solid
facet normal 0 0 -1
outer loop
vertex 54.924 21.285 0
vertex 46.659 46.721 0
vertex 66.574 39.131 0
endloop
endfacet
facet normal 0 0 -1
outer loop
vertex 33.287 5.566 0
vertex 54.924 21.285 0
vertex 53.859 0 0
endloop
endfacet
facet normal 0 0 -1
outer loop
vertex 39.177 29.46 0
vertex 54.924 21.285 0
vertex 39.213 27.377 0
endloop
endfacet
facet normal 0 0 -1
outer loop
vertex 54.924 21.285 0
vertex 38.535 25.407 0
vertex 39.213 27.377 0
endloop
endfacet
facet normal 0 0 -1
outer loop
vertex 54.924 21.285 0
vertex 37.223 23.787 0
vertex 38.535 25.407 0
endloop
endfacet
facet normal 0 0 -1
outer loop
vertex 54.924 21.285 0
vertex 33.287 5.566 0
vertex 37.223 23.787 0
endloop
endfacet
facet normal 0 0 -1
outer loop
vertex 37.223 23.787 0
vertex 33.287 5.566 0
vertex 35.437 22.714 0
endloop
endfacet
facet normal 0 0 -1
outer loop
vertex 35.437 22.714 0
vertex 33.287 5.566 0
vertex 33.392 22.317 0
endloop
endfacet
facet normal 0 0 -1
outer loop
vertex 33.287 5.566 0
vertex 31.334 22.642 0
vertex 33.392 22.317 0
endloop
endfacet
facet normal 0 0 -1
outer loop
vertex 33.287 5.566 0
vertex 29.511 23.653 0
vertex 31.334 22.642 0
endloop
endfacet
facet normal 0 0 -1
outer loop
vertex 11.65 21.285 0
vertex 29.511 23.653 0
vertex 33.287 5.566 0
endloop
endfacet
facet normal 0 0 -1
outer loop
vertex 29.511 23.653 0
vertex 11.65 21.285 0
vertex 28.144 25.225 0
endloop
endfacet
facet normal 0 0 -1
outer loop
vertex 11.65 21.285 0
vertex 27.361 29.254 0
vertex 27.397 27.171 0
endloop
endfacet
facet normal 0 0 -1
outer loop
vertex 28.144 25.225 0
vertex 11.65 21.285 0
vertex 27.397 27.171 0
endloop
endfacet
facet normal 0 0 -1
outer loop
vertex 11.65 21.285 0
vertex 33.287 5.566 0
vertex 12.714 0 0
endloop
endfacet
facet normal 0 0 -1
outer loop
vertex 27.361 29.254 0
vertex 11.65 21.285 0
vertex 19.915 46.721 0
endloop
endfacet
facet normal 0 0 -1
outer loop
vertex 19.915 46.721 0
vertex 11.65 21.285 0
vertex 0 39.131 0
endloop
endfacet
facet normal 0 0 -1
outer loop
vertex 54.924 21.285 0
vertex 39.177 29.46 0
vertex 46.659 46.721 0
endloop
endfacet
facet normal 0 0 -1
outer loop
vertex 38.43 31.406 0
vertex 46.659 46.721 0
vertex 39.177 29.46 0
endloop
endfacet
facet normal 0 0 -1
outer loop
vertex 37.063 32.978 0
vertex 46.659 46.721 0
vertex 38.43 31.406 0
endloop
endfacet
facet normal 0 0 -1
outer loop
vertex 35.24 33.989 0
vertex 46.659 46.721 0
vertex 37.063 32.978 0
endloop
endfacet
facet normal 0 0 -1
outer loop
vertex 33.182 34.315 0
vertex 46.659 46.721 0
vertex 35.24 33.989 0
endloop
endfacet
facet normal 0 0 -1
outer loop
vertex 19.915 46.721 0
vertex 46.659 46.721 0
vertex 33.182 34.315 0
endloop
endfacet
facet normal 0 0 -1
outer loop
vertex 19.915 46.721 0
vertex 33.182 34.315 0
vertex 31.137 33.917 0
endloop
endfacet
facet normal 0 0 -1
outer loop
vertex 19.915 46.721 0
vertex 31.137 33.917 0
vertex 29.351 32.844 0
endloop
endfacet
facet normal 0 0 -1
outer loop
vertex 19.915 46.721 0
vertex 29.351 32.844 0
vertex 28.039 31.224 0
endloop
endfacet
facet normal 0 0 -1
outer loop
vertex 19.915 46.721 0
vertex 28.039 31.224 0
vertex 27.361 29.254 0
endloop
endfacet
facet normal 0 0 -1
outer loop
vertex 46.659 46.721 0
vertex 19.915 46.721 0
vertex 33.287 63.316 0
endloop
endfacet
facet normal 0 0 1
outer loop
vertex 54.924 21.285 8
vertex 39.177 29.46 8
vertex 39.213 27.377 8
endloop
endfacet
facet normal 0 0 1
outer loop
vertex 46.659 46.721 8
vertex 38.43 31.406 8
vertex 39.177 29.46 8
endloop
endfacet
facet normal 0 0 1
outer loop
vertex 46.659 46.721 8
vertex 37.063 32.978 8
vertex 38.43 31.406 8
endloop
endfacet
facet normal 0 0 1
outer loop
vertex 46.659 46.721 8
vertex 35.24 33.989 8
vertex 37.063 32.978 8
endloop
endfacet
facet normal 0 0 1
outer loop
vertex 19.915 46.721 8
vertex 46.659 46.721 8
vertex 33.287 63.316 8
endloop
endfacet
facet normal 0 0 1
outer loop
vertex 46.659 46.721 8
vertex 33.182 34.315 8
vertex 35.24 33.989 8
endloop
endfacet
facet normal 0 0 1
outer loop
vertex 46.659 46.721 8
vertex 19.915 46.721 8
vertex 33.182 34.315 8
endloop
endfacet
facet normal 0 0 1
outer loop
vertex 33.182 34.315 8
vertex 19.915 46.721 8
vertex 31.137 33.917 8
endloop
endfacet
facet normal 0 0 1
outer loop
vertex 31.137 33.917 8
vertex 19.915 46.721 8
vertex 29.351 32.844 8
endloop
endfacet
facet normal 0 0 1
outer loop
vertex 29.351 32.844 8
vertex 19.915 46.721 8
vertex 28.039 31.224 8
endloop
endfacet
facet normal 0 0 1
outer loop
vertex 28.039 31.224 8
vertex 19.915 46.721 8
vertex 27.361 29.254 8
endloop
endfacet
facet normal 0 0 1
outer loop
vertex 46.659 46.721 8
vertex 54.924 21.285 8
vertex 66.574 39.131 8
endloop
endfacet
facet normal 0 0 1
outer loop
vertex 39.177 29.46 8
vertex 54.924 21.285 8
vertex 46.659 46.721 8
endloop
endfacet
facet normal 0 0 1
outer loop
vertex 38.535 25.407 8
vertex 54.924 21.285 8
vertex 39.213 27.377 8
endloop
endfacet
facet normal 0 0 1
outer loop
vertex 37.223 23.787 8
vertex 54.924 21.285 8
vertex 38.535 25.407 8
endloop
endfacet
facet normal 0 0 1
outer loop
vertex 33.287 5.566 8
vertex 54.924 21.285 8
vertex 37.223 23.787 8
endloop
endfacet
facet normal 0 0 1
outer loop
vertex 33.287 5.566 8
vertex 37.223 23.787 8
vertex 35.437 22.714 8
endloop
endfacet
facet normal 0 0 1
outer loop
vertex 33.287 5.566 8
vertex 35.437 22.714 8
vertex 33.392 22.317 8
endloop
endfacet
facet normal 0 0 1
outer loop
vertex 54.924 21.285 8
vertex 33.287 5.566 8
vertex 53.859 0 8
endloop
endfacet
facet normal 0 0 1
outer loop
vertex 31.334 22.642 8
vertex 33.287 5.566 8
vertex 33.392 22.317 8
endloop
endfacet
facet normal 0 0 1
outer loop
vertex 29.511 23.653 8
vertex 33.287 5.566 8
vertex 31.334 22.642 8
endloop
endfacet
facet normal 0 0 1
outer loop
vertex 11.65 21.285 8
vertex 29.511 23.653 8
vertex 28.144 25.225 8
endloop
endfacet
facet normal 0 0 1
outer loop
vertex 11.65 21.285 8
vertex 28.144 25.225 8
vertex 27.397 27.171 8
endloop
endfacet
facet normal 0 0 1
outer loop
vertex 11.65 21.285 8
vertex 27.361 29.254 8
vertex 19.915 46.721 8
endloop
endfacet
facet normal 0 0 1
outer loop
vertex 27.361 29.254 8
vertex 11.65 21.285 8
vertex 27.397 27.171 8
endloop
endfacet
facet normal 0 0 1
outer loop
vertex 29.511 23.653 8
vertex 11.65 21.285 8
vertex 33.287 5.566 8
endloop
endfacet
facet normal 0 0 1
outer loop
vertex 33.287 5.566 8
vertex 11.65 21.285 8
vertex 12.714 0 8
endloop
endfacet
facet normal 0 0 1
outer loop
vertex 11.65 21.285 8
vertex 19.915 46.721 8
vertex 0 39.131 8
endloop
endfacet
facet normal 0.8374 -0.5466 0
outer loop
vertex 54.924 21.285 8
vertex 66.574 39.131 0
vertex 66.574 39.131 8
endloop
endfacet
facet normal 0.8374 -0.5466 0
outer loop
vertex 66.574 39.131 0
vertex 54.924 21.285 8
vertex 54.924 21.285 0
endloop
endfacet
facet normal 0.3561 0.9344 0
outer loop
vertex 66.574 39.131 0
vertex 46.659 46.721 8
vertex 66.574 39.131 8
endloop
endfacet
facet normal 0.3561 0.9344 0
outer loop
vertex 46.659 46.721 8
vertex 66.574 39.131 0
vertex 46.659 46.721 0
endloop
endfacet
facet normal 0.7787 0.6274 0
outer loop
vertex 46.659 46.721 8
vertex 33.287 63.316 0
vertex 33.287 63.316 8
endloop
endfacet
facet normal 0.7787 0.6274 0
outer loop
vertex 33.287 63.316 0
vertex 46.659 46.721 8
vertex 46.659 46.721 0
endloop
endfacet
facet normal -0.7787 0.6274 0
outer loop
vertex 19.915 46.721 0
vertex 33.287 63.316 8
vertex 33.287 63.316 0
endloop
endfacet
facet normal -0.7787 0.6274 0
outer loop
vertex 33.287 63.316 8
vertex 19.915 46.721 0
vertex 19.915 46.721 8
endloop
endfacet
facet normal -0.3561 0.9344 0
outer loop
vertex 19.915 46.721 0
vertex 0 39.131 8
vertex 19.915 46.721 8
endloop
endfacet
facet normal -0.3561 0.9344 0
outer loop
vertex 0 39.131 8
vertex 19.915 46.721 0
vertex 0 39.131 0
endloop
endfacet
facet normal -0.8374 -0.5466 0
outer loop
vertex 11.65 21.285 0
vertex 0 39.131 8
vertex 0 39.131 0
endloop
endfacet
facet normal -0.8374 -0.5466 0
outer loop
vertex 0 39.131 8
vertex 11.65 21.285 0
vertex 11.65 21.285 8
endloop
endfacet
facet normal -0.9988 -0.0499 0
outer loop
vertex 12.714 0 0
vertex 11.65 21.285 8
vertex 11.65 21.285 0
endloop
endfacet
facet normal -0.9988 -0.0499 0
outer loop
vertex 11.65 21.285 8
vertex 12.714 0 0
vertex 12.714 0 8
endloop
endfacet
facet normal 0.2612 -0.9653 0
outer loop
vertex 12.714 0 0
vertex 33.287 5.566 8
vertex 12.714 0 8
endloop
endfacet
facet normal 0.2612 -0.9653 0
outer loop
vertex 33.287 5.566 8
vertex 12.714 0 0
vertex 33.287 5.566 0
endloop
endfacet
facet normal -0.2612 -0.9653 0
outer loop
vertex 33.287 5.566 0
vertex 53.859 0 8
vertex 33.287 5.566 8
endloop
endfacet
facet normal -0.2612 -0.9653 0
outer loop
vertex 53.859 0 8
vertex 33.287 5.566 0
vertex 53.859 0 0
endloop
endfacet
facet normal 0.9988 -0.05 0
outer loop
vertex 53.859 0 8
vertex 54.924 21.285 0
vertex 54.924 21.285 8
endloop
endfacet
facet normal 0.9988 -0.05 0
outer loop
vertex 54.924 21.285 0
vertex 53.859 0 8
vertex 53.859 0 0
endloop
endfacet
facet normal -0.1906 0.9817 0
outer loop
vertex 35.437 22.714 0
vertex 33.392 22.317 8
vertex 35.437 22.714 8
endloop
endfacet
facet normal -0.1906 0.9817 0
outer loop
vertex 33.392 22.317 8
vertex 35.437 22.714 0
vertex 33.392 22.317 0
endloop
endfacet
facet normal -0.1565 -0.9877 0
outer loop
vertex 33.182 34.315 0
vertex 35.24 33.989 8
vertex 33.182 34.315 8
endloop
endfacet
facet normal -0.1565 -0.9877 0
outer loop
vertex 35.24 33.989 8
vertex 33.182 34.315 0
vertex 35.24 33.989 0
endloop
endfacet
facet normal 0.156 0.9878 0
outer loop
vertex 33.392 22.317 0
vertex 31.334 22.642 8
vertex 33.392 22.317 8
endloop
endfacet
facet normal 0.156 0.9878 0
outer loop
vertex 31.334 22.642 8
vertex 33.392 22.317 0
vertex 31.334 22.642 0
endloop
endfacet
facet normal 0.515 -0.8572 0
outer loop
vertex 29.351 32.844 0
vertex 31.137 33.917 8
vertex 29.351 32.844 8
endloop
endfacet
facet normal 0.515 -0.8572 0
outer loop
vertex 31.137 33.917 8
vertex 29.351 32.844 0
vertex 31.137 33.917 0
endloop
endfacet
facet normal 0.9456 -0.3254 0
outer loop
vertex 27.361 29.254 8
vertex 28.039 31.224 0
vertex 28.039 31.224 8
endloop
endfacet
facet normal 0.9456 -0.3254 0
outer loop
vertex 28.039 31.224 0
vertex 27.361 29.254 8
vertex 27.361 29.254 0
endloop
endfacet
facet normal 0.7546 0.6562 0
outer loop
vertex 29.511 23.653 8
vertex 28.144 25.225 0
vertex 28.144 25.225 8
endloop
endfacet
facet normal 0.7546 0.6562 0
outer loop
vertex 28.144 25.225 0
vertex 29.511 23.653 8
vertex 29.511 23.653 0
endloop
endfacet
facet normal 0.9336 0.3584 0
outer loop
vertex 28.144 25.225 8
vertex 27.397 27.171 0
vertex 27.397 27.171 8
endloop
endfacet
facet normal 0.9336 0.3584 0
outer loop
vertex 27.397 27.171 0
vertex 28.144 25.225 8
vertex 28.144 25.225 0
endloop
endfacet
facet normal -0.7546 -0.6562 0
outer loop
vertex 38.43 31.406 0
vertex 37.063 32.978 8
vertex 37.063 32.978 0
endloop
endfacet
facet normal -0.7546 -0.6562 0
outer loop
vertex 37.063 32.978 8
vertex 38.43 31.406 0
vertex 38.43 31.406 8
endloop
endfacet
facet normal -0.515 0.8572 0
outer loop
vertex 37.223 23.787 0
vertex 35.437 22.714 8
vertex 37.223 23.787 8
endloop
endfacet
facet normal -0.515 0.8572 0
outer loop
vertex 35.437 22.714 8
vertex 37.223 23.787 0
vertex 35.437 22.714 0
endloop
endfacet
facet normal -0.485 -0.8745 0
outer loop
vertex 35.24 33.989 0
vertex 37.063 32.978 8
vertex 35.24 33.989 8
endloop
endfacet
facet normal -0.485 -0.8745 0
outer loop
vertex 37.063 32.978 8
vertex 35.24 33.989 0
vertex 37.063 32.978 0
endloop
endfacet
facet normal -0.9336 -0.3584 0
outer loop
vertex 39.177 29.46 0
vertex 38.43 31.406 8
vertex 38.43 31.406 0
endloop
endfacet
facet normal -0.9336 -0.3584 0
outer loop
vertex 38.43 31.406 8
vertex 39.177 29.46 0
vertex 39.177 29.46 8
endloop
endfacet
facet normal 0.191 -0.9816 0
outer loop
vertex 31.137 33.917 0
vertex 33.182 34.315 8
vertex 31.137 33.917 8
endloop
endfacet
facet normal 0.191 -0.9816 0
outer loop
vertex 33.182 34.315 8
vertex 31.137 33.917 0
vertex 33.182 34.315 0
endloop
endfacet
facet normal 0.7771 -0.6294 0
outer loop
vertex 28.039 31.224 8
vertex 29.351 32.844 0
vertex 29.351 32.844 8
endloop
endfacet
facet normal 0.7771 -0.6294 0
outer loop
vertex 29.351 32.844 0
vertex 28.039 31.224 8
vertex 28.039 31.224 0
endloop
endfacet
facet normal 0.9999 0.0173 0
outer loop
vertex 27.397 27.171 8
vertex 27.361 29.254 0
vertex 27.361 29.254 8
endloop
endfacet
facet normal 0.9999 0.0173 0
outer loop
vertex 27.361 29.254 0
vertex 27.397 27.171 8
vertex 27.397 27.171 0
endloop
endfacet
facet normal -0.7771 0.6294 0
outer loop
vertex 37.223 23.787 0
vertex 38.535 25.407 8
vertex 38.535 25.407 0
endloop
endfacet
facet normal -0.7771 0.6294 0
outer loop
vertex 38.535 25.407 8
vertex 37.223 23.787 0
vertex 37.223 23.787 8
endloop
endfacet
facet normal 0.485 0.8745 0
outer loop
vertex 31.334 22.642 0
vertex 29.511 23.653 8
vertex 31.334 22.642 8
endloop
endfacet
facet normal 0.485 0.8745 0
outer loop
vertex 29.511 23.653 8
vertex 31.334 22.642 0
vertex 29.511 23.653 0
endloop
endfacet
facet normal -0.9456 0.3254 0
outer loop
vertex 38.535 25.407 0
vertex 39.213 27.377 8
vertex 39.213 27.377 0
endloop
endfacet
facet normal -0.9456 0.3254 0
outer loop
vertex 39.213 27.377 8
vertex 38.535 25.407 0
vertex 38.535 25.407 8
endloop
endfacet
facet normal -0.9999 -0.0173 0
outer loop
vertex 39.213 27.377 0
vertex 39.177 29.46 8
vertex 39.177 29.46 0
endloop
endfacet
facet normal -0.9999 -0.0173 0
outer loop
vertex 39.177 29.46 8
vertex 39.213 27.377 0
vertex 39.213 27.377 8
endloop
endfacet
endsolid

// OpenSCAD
$fn = 32;

// ----------------------------------------------------------------------
// Star wheel: 5-point blunt, R35
// ----------------------------------------------------------------------

// --- parameters (mm) ---
n_points = 5;             // number of points / teeth
r_out = 35;               // tip radius
r_in = 22.75;             // root radius
bore_r = 6;               // centre bore radius
plate_t = 8;              // plate thickness, Z (extrusion height)
bore_d = 12;              // centre bore diameter
fit_tol = 0.05;           // declared fit tolerance (prompt contract)
free_tol = 0.3;           // declared free tolerance (prompt contract)

profile = [[33.287, 63.316], [19.915, 46.721], [0, 39.131], [11.65, 21.285], [12.714, 0], [33.287, 5.566], [53.859, 0], [54.924, 21.285], [66.574, 39.131], [46.659, 46.721]];  // primary outline, 10 points, counter clockwise
void_1 = [[39.177, 29.46], [38.43, 31.406], [37.063, 32.978], [35.24, 33.989], [33.182, 34.315], [31.137, 33.917], [29.351, 32.844], [28.039, 31.224], [27.361, 29.254], [27.397, 27.171], [28.144, 25.225], [29.511, 23.653], [31.334, 22.642], [33.392, 22.317], [35.437, 22.714], [37.223, 23.787], [38.535, 25.407], [39.213, 27.377]];  // centre bore, 18 points

// --- the one profile operation ---
difference() {
  linear_extrude(height = plate_t) polygon(points = profile);
  translate([0, 0, -1])
    linear_extrude(height = plate_t + 2) polygon(points = void_1);
}
